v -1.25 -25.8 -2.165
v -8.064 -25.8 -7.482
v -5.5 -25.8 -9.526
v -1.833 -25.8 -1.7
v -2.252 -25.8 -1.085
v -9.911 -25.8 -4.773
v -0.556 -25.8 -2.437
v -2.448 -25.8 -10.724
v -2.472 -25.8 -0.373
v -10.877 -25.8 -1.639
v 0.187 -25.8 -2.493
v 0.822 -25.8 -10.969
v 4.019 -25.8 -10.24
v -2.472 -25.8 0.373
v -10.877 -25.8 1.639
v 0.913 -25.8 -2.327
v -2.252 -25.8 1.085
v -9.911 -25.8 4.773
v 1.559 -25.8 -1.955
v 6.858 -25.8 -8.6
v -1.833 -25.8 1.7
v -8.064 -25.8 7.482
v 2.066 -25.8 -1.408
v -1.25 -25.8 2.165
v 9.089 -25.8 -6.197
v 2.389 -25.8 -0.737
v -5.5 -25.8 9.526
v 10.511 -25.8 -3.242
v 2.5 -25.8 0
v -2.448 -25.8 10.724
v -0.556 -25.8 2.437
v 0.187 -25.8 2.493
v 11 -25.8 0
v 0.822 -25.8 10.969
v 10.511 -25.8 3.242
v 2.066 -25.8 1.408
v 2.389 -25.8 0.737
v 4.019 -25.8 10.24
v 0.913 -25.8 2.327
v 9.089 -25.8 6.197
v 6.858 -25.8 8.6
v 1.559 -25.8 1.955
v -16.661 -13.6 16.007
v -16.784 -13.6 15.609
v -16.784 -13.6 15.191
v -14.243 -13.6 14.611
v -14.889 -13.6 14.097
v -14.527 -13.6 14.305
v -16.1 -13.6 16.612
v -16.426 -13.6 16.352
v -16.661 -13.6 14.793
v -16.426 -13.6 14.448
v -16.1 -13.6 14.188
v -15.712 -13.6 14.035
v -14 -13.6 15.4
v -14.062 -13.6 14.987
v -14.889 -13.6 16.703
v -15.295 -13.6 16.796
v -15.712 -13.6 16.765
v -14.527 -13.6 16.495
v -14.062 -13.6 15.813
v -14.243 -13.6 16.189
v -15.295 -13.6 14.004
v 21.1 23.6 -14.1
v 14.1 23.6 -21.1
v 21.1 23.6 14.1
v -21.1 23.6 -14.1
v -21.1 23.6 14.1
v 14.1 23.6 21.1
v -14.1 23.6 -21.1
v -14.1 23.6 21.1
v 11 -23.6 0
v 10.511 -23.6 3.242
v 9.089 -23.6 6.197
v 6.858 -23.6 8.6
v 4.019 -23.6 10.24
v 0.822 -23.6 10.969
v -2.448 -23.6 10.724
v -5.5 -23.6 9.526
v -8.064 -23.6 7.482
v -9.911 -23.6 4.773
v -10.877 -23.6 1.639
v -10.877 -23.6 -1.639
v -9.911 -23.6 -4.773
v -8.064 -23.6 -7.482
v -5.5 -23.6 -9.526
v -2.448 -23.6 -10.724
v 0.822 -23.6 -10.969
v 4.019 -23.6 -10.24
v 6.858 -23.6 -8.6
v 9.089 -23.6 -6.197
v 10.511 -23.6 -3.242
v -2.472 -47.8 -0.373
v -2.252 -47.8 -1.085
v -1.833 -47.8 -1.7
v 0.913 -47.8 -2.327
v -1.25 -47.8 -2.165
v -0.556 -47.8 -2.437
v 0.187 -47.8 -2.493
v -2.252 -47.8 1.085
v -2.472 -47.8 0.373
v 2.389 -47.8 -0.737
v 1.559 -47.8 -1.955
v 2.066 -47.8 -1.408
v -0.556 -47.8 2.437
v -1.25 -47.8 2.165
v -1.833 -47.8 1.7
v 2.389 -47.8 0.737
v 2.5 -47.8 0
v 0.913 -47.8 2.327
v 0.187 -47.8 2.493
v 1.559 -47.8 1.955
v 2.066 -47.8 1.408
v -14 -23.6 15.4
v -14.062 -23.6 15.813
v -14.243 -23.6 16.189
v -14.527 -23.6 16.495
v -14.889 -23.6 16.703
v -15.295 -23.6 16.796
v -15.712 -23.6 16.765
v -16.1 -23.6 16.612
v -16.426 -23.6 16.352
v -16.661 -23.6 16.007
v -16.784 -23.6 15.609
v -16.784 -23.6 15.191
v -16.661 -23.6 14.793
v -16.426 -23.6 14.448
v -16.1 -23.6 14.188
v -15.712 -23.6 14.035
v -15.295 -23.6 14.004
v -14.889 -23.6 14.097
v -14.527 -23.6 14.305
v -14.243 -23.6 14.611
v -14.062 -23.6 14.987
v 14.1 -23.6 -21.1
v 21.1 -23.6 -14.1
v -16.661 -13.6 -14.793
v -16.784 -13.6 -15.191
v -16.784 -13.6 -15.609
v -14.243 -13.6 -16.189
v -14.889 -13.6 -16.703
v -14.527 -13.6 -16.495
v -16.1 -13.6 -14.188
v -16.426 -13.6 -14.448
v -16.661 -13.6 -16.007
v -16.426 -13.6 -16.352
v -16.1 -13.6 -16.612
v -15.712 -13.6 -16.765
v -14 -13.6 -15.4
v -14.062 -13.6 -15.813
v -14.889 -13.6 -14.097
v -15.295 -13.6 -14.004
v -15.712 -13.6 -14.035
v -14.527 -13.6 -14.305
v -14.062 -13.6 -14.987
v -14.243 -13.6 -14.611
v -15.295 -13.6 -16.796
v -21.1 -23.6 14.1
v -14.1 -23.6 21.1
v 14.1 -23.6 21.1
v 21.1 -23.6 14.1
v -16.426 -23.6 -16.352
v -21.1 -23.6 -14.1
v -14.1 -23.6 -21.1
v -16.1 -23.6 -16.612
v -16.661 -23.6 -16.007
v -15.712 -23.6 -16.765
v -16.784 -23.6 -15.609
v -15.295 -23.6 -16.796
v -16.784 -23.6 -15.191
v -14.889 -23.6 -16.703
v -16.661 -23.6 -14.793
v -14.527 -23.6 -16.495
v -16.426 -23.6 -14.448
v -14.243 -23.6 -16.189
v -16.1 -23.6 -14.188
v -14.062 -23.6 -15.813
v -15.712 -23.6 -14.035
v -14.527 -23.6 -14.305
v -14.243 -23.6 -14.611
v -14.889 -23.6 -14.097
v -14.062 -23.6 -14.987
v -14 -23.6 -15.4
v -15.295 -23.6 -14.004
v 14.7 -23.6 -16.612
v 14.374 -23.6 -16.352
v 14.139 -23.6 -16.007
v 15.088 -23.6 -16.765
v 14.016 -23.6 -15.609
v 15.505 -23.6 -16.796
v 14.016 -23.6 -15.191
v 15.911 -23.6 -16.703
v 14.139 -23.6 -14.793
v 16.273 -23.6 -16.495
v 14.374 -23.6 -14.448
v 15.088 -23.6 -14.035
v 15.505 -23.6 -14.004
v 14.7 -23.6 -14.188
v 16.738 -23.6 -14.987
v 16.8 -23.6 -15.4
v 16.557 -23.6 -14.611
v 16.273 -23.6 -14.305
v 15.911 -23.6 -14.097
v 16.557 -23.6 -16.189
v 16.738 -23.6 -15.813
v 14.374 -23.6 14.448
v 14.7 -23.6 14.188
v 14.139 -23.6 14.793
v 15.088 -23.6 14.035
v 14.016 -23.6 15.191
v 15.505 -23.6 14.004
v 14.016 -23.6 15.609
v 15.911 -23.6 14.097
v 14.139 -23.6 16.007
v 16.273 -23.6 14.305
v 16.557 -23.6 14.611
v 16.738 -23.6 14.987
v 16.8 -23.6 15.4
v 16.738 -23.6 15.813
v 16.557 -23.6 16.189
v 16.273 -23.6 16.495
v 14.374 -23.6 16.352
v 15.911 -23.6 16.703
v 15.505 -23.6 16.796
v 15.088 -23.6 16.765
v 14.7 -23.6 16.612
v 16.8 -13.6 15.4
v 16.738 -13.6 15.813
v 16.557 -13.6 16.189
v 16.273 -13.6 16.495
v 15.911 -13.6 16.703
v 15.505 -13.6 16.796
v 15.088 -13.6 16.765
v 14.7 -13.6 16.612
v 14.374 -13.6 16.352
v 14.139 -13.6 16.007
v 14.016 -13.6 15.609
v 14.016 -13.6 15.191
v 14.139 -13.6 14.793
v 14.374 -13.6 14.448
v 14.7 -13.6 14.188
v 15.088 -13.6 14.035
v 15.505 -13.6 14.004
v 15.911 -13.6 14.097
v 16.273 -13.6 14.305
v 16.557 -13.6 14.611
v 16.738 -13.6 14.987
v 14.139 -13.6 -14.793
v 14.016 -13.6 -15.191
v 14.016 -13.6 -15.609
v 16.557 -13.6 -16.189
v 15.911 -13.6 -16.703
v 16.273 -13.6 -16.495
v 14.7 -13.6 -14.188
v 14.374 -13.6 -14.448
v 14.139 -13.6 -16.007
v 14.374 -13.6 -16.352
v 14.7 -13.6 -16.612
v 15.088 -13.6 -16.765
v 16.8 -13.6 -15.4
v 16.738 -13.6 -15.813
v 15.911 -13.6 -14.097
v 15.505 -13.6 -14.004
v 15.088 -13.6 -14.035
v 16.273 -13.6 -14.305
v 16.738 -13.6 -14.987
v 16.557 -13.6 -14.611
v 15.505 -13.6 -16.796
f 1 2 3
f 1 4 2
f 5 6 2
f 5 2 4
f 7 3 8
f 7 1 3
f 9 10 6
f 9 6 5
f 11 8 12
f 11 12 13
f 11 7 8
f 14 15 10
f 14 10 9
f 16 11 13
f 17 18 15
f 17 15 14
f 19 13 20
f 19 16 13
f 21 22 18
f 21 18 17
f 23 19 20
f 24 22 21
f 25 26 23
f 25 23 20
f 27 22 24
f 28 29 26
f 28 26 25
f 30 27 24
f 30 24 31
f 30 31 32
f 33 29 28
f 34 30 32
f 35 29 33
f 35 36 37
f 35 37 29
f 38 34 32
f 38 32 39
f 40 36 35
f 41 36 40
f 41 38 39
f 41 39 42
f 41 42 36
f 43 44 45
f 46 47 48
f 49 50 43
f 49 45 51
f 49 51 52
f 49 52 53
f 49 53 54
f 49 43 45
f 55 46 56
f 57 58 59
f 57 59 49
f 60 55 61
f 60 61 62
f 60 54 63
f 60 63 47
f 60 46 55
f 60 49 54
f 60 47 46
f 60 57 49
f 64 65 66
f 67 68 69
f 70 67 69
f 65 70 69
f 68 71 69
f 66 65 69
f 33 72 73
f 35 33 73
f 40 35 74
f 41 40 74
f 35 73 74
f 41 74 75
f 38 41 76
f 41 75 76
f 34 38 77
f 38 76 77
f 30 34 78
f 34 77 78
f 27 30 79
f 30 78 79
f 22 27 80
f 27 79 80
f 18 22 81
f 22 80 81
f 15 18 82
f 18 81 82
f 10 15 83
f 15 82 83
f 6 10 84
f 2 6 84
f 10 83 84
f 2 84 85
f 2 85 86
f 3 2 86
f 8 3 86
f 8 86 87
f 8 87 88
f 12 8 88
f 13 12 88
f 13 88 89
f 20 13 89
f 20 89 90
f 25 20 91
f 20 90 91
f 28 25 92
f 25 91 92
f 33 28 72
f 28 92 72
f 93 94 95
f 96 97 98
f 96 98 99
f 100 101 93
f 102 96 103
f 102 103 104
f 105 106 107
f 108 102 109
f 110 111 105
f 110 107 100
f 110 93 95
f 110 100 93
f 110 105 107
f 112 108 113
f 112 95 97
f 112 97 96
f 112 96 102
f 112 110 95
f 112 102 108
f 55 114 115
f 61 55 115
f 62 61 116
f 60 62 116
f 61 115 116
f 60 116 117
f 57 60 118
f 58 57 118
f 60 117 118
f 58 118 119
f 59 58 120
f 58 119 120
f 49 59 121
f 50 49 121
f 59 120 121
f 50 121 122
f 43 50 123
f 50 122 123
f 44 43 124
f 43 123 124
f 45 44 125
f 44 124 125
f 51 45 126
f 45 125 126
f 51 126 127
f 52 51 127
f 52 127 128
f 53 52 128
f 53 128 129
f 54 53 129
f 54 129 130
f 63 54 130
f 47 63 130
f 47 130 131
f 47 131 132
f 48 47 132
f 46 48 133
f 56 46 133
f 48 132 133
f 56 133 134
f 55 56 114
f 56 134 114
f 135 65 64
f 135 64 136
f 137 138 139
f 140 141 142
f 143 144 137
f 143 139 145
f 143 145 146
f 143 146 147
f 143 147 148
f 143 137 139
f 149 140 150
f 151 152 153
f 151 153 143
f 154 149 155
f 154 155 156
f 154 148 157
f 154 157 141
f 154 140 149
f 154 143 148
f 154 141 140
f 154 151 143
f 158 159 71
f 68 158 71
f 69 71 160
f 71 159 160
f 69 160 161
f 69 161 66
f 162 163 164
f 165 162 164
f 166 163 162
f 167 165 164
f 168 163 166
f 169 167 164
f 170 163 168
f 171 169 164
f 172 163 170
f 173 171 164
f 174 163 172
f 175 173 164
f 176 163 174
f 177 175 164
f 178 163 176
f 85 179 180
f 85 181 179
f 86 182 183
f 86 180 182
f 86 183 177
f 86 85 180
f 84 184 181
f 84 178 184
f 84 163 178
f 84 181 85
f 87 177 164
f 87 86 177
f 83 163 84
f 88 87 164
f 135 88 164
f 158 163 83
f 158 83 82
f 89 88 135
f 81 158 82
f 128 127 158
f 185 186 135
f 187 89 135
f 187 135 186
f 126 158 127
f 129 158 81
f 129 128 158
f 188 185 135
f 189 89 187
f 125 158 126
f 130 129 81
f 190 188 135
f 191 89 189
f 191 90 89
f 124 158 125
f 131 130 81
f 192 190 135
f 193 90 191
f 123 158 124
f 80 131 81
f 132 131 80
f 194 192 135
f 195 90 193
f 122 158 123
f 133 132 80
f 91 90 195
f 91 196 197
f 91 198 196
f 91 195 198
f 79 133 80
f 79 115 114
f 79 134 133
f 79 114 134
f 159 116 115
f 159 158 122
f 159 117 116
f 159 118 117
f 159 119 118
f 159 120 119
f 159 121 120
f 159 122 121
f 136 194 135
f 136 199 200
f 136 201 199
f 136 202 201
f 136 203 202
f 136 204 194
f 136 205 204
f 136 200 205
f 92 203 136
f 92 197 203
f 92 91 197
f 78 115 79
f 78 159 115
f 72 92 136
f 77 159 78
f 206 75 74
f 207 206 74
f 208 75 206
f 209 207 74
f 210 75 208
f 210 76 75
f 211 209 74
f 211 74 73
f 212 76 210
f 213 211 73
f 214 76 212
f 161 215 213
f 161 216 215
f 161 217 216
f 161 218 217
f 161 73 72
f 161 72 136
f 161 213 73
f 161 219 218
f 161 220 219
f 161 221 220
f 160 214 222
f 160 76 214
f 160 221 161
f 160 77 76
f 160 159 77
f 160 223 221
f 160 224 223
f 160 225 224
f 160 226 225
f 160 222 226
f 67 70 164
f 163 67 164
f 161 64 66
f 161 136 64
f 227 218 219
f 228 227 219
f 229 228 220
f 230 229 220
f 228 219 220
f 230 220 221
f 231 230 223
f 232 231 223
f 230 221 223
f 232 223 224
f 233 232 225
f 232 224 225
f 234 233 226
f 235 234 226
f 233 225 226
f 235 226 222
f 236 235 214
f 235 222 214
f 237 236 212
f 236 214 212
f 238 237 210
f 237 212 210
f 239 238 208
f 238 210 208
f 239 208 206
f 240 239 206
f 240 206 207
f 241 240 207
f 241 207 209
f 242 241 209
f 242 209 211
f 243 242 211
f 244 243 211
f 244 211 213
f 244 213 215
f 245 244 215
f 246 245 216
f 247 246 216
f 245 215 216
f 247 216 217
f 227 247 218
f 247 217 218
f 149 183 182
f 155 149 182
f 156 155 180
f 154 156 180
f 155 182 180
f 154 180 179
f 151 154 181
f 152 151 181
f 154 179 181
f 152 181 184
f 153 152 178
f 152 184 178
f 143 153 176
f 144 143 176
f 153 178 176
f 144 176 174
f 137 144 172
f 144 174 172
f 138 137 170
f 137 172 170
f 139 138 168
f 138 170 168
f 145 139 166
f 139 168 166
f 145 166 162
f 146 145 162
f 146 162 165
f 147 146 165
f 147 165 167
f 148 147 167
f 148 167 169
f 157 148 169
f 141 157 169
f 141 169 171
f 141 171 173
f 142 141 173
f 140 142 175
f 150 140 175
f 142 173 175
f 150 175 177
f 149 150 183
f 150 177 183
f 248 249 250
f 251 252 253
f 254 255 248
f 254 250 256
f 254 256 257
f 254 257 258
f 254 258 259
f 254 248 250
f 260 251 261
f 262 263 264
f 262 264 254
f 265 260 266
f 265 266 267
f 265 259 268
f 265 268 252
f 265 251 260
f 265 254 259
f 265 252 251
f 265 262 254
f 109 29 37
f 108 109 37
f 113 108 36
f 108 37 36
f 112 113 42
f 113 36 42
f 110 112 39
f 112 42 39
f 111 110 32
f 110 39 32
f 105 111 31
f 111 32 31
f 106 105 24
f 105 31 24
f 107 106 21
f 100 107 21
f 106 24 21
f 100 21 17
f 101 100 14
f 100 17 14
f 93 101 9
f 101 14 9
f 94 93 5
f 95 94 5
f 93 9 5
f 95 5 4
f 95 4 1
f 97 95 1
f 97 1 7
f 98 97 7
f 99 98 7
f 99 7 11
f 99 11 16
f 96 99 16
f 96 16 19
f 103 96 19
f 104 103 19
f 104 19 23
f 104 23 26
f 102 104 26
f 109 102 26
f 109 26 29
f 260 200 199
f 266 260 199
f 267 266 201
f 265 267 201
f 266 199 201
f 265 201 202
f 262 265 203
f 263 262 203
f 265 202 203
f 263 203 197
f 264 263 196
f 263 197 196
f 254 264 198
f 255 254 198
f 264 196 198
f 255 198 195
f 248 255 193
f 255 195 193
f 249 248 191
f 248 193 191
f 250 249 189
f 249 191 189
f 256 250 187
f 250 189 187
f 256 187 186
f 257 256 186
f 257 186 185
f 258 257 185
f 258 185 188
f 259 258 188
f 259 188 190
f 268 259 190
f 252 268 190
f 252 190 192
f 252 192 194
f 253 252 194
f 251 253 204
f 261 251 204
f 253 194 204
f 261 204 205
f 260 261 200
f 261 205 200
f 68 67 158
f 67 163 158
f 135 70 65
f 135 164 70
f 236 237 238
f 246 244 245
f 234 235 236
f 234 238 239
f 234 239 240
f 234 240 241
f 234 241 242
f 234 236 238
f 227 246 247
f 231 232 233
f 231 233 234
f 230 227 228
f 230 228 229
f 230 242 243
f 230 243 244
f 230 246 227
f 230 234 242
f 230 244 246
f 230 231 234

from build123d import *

# Parameters (mm, degrees)
F0_W     = 42.2
F0_H     = 42.2
F1_DEPTH = 23.6
F2_SIZE  = 7
F3_R     = 2.5
F4_DEPTH = 24.2
F5_R     = 11
F6_DEPTH = 2.2
F7_R     = 1.4
F8_DEPTH = 10


with BuildPart() as f1:
    # F0 (on Front) → F1 (new body, symmetric)
    with BuildSketch(Plane.XZ):
        Rectangle(F0_W, F0_H)
    extrude(amount=F1_DEPTH, both=True)

    # F2
    f2_edges = [f1.edges().sort_by_distance(p)[0] for p in [
        (21.1, 0, 21.1),
        (-21.1, 0, 21.1),
        (21.1, 0, -21.1),
        (-21.1, 0, -21.1),
    ]]
    chamfer(f2_edges, length=F2_SIZE)

    # F3 (on face) → F4 (join)
    with BuildSketch(Plane.XZ.offset(23.6)):
        Circle(F3_R)
    extrude(amount=F4_DEPTH)

    # F5 (on face) → F6 (join)
    with BuildSketch(Plane.XZ.offset(23.6)):
        Circle(F5_R)
    extrude(amount=F6_DEPTH)

    # F7 (on face) → F8 (cut)
    with BuildSketch(Plane.XZ.offset(23.6)):
        with Locations((-15.4, -15.4)):
            Circle(F7_R)
        with Locations((-15.4, 15.4)):
            Circle(F7_R)
        with Locations((15.4, -15.4)):
            Circle(F7_R)
        with Locations((15.4, 15.4)):
            Circle(F7_R)
    extrude(amount=-F8_DEPTH, mode=Mode.SUBTRACT)


solid = f1.part
